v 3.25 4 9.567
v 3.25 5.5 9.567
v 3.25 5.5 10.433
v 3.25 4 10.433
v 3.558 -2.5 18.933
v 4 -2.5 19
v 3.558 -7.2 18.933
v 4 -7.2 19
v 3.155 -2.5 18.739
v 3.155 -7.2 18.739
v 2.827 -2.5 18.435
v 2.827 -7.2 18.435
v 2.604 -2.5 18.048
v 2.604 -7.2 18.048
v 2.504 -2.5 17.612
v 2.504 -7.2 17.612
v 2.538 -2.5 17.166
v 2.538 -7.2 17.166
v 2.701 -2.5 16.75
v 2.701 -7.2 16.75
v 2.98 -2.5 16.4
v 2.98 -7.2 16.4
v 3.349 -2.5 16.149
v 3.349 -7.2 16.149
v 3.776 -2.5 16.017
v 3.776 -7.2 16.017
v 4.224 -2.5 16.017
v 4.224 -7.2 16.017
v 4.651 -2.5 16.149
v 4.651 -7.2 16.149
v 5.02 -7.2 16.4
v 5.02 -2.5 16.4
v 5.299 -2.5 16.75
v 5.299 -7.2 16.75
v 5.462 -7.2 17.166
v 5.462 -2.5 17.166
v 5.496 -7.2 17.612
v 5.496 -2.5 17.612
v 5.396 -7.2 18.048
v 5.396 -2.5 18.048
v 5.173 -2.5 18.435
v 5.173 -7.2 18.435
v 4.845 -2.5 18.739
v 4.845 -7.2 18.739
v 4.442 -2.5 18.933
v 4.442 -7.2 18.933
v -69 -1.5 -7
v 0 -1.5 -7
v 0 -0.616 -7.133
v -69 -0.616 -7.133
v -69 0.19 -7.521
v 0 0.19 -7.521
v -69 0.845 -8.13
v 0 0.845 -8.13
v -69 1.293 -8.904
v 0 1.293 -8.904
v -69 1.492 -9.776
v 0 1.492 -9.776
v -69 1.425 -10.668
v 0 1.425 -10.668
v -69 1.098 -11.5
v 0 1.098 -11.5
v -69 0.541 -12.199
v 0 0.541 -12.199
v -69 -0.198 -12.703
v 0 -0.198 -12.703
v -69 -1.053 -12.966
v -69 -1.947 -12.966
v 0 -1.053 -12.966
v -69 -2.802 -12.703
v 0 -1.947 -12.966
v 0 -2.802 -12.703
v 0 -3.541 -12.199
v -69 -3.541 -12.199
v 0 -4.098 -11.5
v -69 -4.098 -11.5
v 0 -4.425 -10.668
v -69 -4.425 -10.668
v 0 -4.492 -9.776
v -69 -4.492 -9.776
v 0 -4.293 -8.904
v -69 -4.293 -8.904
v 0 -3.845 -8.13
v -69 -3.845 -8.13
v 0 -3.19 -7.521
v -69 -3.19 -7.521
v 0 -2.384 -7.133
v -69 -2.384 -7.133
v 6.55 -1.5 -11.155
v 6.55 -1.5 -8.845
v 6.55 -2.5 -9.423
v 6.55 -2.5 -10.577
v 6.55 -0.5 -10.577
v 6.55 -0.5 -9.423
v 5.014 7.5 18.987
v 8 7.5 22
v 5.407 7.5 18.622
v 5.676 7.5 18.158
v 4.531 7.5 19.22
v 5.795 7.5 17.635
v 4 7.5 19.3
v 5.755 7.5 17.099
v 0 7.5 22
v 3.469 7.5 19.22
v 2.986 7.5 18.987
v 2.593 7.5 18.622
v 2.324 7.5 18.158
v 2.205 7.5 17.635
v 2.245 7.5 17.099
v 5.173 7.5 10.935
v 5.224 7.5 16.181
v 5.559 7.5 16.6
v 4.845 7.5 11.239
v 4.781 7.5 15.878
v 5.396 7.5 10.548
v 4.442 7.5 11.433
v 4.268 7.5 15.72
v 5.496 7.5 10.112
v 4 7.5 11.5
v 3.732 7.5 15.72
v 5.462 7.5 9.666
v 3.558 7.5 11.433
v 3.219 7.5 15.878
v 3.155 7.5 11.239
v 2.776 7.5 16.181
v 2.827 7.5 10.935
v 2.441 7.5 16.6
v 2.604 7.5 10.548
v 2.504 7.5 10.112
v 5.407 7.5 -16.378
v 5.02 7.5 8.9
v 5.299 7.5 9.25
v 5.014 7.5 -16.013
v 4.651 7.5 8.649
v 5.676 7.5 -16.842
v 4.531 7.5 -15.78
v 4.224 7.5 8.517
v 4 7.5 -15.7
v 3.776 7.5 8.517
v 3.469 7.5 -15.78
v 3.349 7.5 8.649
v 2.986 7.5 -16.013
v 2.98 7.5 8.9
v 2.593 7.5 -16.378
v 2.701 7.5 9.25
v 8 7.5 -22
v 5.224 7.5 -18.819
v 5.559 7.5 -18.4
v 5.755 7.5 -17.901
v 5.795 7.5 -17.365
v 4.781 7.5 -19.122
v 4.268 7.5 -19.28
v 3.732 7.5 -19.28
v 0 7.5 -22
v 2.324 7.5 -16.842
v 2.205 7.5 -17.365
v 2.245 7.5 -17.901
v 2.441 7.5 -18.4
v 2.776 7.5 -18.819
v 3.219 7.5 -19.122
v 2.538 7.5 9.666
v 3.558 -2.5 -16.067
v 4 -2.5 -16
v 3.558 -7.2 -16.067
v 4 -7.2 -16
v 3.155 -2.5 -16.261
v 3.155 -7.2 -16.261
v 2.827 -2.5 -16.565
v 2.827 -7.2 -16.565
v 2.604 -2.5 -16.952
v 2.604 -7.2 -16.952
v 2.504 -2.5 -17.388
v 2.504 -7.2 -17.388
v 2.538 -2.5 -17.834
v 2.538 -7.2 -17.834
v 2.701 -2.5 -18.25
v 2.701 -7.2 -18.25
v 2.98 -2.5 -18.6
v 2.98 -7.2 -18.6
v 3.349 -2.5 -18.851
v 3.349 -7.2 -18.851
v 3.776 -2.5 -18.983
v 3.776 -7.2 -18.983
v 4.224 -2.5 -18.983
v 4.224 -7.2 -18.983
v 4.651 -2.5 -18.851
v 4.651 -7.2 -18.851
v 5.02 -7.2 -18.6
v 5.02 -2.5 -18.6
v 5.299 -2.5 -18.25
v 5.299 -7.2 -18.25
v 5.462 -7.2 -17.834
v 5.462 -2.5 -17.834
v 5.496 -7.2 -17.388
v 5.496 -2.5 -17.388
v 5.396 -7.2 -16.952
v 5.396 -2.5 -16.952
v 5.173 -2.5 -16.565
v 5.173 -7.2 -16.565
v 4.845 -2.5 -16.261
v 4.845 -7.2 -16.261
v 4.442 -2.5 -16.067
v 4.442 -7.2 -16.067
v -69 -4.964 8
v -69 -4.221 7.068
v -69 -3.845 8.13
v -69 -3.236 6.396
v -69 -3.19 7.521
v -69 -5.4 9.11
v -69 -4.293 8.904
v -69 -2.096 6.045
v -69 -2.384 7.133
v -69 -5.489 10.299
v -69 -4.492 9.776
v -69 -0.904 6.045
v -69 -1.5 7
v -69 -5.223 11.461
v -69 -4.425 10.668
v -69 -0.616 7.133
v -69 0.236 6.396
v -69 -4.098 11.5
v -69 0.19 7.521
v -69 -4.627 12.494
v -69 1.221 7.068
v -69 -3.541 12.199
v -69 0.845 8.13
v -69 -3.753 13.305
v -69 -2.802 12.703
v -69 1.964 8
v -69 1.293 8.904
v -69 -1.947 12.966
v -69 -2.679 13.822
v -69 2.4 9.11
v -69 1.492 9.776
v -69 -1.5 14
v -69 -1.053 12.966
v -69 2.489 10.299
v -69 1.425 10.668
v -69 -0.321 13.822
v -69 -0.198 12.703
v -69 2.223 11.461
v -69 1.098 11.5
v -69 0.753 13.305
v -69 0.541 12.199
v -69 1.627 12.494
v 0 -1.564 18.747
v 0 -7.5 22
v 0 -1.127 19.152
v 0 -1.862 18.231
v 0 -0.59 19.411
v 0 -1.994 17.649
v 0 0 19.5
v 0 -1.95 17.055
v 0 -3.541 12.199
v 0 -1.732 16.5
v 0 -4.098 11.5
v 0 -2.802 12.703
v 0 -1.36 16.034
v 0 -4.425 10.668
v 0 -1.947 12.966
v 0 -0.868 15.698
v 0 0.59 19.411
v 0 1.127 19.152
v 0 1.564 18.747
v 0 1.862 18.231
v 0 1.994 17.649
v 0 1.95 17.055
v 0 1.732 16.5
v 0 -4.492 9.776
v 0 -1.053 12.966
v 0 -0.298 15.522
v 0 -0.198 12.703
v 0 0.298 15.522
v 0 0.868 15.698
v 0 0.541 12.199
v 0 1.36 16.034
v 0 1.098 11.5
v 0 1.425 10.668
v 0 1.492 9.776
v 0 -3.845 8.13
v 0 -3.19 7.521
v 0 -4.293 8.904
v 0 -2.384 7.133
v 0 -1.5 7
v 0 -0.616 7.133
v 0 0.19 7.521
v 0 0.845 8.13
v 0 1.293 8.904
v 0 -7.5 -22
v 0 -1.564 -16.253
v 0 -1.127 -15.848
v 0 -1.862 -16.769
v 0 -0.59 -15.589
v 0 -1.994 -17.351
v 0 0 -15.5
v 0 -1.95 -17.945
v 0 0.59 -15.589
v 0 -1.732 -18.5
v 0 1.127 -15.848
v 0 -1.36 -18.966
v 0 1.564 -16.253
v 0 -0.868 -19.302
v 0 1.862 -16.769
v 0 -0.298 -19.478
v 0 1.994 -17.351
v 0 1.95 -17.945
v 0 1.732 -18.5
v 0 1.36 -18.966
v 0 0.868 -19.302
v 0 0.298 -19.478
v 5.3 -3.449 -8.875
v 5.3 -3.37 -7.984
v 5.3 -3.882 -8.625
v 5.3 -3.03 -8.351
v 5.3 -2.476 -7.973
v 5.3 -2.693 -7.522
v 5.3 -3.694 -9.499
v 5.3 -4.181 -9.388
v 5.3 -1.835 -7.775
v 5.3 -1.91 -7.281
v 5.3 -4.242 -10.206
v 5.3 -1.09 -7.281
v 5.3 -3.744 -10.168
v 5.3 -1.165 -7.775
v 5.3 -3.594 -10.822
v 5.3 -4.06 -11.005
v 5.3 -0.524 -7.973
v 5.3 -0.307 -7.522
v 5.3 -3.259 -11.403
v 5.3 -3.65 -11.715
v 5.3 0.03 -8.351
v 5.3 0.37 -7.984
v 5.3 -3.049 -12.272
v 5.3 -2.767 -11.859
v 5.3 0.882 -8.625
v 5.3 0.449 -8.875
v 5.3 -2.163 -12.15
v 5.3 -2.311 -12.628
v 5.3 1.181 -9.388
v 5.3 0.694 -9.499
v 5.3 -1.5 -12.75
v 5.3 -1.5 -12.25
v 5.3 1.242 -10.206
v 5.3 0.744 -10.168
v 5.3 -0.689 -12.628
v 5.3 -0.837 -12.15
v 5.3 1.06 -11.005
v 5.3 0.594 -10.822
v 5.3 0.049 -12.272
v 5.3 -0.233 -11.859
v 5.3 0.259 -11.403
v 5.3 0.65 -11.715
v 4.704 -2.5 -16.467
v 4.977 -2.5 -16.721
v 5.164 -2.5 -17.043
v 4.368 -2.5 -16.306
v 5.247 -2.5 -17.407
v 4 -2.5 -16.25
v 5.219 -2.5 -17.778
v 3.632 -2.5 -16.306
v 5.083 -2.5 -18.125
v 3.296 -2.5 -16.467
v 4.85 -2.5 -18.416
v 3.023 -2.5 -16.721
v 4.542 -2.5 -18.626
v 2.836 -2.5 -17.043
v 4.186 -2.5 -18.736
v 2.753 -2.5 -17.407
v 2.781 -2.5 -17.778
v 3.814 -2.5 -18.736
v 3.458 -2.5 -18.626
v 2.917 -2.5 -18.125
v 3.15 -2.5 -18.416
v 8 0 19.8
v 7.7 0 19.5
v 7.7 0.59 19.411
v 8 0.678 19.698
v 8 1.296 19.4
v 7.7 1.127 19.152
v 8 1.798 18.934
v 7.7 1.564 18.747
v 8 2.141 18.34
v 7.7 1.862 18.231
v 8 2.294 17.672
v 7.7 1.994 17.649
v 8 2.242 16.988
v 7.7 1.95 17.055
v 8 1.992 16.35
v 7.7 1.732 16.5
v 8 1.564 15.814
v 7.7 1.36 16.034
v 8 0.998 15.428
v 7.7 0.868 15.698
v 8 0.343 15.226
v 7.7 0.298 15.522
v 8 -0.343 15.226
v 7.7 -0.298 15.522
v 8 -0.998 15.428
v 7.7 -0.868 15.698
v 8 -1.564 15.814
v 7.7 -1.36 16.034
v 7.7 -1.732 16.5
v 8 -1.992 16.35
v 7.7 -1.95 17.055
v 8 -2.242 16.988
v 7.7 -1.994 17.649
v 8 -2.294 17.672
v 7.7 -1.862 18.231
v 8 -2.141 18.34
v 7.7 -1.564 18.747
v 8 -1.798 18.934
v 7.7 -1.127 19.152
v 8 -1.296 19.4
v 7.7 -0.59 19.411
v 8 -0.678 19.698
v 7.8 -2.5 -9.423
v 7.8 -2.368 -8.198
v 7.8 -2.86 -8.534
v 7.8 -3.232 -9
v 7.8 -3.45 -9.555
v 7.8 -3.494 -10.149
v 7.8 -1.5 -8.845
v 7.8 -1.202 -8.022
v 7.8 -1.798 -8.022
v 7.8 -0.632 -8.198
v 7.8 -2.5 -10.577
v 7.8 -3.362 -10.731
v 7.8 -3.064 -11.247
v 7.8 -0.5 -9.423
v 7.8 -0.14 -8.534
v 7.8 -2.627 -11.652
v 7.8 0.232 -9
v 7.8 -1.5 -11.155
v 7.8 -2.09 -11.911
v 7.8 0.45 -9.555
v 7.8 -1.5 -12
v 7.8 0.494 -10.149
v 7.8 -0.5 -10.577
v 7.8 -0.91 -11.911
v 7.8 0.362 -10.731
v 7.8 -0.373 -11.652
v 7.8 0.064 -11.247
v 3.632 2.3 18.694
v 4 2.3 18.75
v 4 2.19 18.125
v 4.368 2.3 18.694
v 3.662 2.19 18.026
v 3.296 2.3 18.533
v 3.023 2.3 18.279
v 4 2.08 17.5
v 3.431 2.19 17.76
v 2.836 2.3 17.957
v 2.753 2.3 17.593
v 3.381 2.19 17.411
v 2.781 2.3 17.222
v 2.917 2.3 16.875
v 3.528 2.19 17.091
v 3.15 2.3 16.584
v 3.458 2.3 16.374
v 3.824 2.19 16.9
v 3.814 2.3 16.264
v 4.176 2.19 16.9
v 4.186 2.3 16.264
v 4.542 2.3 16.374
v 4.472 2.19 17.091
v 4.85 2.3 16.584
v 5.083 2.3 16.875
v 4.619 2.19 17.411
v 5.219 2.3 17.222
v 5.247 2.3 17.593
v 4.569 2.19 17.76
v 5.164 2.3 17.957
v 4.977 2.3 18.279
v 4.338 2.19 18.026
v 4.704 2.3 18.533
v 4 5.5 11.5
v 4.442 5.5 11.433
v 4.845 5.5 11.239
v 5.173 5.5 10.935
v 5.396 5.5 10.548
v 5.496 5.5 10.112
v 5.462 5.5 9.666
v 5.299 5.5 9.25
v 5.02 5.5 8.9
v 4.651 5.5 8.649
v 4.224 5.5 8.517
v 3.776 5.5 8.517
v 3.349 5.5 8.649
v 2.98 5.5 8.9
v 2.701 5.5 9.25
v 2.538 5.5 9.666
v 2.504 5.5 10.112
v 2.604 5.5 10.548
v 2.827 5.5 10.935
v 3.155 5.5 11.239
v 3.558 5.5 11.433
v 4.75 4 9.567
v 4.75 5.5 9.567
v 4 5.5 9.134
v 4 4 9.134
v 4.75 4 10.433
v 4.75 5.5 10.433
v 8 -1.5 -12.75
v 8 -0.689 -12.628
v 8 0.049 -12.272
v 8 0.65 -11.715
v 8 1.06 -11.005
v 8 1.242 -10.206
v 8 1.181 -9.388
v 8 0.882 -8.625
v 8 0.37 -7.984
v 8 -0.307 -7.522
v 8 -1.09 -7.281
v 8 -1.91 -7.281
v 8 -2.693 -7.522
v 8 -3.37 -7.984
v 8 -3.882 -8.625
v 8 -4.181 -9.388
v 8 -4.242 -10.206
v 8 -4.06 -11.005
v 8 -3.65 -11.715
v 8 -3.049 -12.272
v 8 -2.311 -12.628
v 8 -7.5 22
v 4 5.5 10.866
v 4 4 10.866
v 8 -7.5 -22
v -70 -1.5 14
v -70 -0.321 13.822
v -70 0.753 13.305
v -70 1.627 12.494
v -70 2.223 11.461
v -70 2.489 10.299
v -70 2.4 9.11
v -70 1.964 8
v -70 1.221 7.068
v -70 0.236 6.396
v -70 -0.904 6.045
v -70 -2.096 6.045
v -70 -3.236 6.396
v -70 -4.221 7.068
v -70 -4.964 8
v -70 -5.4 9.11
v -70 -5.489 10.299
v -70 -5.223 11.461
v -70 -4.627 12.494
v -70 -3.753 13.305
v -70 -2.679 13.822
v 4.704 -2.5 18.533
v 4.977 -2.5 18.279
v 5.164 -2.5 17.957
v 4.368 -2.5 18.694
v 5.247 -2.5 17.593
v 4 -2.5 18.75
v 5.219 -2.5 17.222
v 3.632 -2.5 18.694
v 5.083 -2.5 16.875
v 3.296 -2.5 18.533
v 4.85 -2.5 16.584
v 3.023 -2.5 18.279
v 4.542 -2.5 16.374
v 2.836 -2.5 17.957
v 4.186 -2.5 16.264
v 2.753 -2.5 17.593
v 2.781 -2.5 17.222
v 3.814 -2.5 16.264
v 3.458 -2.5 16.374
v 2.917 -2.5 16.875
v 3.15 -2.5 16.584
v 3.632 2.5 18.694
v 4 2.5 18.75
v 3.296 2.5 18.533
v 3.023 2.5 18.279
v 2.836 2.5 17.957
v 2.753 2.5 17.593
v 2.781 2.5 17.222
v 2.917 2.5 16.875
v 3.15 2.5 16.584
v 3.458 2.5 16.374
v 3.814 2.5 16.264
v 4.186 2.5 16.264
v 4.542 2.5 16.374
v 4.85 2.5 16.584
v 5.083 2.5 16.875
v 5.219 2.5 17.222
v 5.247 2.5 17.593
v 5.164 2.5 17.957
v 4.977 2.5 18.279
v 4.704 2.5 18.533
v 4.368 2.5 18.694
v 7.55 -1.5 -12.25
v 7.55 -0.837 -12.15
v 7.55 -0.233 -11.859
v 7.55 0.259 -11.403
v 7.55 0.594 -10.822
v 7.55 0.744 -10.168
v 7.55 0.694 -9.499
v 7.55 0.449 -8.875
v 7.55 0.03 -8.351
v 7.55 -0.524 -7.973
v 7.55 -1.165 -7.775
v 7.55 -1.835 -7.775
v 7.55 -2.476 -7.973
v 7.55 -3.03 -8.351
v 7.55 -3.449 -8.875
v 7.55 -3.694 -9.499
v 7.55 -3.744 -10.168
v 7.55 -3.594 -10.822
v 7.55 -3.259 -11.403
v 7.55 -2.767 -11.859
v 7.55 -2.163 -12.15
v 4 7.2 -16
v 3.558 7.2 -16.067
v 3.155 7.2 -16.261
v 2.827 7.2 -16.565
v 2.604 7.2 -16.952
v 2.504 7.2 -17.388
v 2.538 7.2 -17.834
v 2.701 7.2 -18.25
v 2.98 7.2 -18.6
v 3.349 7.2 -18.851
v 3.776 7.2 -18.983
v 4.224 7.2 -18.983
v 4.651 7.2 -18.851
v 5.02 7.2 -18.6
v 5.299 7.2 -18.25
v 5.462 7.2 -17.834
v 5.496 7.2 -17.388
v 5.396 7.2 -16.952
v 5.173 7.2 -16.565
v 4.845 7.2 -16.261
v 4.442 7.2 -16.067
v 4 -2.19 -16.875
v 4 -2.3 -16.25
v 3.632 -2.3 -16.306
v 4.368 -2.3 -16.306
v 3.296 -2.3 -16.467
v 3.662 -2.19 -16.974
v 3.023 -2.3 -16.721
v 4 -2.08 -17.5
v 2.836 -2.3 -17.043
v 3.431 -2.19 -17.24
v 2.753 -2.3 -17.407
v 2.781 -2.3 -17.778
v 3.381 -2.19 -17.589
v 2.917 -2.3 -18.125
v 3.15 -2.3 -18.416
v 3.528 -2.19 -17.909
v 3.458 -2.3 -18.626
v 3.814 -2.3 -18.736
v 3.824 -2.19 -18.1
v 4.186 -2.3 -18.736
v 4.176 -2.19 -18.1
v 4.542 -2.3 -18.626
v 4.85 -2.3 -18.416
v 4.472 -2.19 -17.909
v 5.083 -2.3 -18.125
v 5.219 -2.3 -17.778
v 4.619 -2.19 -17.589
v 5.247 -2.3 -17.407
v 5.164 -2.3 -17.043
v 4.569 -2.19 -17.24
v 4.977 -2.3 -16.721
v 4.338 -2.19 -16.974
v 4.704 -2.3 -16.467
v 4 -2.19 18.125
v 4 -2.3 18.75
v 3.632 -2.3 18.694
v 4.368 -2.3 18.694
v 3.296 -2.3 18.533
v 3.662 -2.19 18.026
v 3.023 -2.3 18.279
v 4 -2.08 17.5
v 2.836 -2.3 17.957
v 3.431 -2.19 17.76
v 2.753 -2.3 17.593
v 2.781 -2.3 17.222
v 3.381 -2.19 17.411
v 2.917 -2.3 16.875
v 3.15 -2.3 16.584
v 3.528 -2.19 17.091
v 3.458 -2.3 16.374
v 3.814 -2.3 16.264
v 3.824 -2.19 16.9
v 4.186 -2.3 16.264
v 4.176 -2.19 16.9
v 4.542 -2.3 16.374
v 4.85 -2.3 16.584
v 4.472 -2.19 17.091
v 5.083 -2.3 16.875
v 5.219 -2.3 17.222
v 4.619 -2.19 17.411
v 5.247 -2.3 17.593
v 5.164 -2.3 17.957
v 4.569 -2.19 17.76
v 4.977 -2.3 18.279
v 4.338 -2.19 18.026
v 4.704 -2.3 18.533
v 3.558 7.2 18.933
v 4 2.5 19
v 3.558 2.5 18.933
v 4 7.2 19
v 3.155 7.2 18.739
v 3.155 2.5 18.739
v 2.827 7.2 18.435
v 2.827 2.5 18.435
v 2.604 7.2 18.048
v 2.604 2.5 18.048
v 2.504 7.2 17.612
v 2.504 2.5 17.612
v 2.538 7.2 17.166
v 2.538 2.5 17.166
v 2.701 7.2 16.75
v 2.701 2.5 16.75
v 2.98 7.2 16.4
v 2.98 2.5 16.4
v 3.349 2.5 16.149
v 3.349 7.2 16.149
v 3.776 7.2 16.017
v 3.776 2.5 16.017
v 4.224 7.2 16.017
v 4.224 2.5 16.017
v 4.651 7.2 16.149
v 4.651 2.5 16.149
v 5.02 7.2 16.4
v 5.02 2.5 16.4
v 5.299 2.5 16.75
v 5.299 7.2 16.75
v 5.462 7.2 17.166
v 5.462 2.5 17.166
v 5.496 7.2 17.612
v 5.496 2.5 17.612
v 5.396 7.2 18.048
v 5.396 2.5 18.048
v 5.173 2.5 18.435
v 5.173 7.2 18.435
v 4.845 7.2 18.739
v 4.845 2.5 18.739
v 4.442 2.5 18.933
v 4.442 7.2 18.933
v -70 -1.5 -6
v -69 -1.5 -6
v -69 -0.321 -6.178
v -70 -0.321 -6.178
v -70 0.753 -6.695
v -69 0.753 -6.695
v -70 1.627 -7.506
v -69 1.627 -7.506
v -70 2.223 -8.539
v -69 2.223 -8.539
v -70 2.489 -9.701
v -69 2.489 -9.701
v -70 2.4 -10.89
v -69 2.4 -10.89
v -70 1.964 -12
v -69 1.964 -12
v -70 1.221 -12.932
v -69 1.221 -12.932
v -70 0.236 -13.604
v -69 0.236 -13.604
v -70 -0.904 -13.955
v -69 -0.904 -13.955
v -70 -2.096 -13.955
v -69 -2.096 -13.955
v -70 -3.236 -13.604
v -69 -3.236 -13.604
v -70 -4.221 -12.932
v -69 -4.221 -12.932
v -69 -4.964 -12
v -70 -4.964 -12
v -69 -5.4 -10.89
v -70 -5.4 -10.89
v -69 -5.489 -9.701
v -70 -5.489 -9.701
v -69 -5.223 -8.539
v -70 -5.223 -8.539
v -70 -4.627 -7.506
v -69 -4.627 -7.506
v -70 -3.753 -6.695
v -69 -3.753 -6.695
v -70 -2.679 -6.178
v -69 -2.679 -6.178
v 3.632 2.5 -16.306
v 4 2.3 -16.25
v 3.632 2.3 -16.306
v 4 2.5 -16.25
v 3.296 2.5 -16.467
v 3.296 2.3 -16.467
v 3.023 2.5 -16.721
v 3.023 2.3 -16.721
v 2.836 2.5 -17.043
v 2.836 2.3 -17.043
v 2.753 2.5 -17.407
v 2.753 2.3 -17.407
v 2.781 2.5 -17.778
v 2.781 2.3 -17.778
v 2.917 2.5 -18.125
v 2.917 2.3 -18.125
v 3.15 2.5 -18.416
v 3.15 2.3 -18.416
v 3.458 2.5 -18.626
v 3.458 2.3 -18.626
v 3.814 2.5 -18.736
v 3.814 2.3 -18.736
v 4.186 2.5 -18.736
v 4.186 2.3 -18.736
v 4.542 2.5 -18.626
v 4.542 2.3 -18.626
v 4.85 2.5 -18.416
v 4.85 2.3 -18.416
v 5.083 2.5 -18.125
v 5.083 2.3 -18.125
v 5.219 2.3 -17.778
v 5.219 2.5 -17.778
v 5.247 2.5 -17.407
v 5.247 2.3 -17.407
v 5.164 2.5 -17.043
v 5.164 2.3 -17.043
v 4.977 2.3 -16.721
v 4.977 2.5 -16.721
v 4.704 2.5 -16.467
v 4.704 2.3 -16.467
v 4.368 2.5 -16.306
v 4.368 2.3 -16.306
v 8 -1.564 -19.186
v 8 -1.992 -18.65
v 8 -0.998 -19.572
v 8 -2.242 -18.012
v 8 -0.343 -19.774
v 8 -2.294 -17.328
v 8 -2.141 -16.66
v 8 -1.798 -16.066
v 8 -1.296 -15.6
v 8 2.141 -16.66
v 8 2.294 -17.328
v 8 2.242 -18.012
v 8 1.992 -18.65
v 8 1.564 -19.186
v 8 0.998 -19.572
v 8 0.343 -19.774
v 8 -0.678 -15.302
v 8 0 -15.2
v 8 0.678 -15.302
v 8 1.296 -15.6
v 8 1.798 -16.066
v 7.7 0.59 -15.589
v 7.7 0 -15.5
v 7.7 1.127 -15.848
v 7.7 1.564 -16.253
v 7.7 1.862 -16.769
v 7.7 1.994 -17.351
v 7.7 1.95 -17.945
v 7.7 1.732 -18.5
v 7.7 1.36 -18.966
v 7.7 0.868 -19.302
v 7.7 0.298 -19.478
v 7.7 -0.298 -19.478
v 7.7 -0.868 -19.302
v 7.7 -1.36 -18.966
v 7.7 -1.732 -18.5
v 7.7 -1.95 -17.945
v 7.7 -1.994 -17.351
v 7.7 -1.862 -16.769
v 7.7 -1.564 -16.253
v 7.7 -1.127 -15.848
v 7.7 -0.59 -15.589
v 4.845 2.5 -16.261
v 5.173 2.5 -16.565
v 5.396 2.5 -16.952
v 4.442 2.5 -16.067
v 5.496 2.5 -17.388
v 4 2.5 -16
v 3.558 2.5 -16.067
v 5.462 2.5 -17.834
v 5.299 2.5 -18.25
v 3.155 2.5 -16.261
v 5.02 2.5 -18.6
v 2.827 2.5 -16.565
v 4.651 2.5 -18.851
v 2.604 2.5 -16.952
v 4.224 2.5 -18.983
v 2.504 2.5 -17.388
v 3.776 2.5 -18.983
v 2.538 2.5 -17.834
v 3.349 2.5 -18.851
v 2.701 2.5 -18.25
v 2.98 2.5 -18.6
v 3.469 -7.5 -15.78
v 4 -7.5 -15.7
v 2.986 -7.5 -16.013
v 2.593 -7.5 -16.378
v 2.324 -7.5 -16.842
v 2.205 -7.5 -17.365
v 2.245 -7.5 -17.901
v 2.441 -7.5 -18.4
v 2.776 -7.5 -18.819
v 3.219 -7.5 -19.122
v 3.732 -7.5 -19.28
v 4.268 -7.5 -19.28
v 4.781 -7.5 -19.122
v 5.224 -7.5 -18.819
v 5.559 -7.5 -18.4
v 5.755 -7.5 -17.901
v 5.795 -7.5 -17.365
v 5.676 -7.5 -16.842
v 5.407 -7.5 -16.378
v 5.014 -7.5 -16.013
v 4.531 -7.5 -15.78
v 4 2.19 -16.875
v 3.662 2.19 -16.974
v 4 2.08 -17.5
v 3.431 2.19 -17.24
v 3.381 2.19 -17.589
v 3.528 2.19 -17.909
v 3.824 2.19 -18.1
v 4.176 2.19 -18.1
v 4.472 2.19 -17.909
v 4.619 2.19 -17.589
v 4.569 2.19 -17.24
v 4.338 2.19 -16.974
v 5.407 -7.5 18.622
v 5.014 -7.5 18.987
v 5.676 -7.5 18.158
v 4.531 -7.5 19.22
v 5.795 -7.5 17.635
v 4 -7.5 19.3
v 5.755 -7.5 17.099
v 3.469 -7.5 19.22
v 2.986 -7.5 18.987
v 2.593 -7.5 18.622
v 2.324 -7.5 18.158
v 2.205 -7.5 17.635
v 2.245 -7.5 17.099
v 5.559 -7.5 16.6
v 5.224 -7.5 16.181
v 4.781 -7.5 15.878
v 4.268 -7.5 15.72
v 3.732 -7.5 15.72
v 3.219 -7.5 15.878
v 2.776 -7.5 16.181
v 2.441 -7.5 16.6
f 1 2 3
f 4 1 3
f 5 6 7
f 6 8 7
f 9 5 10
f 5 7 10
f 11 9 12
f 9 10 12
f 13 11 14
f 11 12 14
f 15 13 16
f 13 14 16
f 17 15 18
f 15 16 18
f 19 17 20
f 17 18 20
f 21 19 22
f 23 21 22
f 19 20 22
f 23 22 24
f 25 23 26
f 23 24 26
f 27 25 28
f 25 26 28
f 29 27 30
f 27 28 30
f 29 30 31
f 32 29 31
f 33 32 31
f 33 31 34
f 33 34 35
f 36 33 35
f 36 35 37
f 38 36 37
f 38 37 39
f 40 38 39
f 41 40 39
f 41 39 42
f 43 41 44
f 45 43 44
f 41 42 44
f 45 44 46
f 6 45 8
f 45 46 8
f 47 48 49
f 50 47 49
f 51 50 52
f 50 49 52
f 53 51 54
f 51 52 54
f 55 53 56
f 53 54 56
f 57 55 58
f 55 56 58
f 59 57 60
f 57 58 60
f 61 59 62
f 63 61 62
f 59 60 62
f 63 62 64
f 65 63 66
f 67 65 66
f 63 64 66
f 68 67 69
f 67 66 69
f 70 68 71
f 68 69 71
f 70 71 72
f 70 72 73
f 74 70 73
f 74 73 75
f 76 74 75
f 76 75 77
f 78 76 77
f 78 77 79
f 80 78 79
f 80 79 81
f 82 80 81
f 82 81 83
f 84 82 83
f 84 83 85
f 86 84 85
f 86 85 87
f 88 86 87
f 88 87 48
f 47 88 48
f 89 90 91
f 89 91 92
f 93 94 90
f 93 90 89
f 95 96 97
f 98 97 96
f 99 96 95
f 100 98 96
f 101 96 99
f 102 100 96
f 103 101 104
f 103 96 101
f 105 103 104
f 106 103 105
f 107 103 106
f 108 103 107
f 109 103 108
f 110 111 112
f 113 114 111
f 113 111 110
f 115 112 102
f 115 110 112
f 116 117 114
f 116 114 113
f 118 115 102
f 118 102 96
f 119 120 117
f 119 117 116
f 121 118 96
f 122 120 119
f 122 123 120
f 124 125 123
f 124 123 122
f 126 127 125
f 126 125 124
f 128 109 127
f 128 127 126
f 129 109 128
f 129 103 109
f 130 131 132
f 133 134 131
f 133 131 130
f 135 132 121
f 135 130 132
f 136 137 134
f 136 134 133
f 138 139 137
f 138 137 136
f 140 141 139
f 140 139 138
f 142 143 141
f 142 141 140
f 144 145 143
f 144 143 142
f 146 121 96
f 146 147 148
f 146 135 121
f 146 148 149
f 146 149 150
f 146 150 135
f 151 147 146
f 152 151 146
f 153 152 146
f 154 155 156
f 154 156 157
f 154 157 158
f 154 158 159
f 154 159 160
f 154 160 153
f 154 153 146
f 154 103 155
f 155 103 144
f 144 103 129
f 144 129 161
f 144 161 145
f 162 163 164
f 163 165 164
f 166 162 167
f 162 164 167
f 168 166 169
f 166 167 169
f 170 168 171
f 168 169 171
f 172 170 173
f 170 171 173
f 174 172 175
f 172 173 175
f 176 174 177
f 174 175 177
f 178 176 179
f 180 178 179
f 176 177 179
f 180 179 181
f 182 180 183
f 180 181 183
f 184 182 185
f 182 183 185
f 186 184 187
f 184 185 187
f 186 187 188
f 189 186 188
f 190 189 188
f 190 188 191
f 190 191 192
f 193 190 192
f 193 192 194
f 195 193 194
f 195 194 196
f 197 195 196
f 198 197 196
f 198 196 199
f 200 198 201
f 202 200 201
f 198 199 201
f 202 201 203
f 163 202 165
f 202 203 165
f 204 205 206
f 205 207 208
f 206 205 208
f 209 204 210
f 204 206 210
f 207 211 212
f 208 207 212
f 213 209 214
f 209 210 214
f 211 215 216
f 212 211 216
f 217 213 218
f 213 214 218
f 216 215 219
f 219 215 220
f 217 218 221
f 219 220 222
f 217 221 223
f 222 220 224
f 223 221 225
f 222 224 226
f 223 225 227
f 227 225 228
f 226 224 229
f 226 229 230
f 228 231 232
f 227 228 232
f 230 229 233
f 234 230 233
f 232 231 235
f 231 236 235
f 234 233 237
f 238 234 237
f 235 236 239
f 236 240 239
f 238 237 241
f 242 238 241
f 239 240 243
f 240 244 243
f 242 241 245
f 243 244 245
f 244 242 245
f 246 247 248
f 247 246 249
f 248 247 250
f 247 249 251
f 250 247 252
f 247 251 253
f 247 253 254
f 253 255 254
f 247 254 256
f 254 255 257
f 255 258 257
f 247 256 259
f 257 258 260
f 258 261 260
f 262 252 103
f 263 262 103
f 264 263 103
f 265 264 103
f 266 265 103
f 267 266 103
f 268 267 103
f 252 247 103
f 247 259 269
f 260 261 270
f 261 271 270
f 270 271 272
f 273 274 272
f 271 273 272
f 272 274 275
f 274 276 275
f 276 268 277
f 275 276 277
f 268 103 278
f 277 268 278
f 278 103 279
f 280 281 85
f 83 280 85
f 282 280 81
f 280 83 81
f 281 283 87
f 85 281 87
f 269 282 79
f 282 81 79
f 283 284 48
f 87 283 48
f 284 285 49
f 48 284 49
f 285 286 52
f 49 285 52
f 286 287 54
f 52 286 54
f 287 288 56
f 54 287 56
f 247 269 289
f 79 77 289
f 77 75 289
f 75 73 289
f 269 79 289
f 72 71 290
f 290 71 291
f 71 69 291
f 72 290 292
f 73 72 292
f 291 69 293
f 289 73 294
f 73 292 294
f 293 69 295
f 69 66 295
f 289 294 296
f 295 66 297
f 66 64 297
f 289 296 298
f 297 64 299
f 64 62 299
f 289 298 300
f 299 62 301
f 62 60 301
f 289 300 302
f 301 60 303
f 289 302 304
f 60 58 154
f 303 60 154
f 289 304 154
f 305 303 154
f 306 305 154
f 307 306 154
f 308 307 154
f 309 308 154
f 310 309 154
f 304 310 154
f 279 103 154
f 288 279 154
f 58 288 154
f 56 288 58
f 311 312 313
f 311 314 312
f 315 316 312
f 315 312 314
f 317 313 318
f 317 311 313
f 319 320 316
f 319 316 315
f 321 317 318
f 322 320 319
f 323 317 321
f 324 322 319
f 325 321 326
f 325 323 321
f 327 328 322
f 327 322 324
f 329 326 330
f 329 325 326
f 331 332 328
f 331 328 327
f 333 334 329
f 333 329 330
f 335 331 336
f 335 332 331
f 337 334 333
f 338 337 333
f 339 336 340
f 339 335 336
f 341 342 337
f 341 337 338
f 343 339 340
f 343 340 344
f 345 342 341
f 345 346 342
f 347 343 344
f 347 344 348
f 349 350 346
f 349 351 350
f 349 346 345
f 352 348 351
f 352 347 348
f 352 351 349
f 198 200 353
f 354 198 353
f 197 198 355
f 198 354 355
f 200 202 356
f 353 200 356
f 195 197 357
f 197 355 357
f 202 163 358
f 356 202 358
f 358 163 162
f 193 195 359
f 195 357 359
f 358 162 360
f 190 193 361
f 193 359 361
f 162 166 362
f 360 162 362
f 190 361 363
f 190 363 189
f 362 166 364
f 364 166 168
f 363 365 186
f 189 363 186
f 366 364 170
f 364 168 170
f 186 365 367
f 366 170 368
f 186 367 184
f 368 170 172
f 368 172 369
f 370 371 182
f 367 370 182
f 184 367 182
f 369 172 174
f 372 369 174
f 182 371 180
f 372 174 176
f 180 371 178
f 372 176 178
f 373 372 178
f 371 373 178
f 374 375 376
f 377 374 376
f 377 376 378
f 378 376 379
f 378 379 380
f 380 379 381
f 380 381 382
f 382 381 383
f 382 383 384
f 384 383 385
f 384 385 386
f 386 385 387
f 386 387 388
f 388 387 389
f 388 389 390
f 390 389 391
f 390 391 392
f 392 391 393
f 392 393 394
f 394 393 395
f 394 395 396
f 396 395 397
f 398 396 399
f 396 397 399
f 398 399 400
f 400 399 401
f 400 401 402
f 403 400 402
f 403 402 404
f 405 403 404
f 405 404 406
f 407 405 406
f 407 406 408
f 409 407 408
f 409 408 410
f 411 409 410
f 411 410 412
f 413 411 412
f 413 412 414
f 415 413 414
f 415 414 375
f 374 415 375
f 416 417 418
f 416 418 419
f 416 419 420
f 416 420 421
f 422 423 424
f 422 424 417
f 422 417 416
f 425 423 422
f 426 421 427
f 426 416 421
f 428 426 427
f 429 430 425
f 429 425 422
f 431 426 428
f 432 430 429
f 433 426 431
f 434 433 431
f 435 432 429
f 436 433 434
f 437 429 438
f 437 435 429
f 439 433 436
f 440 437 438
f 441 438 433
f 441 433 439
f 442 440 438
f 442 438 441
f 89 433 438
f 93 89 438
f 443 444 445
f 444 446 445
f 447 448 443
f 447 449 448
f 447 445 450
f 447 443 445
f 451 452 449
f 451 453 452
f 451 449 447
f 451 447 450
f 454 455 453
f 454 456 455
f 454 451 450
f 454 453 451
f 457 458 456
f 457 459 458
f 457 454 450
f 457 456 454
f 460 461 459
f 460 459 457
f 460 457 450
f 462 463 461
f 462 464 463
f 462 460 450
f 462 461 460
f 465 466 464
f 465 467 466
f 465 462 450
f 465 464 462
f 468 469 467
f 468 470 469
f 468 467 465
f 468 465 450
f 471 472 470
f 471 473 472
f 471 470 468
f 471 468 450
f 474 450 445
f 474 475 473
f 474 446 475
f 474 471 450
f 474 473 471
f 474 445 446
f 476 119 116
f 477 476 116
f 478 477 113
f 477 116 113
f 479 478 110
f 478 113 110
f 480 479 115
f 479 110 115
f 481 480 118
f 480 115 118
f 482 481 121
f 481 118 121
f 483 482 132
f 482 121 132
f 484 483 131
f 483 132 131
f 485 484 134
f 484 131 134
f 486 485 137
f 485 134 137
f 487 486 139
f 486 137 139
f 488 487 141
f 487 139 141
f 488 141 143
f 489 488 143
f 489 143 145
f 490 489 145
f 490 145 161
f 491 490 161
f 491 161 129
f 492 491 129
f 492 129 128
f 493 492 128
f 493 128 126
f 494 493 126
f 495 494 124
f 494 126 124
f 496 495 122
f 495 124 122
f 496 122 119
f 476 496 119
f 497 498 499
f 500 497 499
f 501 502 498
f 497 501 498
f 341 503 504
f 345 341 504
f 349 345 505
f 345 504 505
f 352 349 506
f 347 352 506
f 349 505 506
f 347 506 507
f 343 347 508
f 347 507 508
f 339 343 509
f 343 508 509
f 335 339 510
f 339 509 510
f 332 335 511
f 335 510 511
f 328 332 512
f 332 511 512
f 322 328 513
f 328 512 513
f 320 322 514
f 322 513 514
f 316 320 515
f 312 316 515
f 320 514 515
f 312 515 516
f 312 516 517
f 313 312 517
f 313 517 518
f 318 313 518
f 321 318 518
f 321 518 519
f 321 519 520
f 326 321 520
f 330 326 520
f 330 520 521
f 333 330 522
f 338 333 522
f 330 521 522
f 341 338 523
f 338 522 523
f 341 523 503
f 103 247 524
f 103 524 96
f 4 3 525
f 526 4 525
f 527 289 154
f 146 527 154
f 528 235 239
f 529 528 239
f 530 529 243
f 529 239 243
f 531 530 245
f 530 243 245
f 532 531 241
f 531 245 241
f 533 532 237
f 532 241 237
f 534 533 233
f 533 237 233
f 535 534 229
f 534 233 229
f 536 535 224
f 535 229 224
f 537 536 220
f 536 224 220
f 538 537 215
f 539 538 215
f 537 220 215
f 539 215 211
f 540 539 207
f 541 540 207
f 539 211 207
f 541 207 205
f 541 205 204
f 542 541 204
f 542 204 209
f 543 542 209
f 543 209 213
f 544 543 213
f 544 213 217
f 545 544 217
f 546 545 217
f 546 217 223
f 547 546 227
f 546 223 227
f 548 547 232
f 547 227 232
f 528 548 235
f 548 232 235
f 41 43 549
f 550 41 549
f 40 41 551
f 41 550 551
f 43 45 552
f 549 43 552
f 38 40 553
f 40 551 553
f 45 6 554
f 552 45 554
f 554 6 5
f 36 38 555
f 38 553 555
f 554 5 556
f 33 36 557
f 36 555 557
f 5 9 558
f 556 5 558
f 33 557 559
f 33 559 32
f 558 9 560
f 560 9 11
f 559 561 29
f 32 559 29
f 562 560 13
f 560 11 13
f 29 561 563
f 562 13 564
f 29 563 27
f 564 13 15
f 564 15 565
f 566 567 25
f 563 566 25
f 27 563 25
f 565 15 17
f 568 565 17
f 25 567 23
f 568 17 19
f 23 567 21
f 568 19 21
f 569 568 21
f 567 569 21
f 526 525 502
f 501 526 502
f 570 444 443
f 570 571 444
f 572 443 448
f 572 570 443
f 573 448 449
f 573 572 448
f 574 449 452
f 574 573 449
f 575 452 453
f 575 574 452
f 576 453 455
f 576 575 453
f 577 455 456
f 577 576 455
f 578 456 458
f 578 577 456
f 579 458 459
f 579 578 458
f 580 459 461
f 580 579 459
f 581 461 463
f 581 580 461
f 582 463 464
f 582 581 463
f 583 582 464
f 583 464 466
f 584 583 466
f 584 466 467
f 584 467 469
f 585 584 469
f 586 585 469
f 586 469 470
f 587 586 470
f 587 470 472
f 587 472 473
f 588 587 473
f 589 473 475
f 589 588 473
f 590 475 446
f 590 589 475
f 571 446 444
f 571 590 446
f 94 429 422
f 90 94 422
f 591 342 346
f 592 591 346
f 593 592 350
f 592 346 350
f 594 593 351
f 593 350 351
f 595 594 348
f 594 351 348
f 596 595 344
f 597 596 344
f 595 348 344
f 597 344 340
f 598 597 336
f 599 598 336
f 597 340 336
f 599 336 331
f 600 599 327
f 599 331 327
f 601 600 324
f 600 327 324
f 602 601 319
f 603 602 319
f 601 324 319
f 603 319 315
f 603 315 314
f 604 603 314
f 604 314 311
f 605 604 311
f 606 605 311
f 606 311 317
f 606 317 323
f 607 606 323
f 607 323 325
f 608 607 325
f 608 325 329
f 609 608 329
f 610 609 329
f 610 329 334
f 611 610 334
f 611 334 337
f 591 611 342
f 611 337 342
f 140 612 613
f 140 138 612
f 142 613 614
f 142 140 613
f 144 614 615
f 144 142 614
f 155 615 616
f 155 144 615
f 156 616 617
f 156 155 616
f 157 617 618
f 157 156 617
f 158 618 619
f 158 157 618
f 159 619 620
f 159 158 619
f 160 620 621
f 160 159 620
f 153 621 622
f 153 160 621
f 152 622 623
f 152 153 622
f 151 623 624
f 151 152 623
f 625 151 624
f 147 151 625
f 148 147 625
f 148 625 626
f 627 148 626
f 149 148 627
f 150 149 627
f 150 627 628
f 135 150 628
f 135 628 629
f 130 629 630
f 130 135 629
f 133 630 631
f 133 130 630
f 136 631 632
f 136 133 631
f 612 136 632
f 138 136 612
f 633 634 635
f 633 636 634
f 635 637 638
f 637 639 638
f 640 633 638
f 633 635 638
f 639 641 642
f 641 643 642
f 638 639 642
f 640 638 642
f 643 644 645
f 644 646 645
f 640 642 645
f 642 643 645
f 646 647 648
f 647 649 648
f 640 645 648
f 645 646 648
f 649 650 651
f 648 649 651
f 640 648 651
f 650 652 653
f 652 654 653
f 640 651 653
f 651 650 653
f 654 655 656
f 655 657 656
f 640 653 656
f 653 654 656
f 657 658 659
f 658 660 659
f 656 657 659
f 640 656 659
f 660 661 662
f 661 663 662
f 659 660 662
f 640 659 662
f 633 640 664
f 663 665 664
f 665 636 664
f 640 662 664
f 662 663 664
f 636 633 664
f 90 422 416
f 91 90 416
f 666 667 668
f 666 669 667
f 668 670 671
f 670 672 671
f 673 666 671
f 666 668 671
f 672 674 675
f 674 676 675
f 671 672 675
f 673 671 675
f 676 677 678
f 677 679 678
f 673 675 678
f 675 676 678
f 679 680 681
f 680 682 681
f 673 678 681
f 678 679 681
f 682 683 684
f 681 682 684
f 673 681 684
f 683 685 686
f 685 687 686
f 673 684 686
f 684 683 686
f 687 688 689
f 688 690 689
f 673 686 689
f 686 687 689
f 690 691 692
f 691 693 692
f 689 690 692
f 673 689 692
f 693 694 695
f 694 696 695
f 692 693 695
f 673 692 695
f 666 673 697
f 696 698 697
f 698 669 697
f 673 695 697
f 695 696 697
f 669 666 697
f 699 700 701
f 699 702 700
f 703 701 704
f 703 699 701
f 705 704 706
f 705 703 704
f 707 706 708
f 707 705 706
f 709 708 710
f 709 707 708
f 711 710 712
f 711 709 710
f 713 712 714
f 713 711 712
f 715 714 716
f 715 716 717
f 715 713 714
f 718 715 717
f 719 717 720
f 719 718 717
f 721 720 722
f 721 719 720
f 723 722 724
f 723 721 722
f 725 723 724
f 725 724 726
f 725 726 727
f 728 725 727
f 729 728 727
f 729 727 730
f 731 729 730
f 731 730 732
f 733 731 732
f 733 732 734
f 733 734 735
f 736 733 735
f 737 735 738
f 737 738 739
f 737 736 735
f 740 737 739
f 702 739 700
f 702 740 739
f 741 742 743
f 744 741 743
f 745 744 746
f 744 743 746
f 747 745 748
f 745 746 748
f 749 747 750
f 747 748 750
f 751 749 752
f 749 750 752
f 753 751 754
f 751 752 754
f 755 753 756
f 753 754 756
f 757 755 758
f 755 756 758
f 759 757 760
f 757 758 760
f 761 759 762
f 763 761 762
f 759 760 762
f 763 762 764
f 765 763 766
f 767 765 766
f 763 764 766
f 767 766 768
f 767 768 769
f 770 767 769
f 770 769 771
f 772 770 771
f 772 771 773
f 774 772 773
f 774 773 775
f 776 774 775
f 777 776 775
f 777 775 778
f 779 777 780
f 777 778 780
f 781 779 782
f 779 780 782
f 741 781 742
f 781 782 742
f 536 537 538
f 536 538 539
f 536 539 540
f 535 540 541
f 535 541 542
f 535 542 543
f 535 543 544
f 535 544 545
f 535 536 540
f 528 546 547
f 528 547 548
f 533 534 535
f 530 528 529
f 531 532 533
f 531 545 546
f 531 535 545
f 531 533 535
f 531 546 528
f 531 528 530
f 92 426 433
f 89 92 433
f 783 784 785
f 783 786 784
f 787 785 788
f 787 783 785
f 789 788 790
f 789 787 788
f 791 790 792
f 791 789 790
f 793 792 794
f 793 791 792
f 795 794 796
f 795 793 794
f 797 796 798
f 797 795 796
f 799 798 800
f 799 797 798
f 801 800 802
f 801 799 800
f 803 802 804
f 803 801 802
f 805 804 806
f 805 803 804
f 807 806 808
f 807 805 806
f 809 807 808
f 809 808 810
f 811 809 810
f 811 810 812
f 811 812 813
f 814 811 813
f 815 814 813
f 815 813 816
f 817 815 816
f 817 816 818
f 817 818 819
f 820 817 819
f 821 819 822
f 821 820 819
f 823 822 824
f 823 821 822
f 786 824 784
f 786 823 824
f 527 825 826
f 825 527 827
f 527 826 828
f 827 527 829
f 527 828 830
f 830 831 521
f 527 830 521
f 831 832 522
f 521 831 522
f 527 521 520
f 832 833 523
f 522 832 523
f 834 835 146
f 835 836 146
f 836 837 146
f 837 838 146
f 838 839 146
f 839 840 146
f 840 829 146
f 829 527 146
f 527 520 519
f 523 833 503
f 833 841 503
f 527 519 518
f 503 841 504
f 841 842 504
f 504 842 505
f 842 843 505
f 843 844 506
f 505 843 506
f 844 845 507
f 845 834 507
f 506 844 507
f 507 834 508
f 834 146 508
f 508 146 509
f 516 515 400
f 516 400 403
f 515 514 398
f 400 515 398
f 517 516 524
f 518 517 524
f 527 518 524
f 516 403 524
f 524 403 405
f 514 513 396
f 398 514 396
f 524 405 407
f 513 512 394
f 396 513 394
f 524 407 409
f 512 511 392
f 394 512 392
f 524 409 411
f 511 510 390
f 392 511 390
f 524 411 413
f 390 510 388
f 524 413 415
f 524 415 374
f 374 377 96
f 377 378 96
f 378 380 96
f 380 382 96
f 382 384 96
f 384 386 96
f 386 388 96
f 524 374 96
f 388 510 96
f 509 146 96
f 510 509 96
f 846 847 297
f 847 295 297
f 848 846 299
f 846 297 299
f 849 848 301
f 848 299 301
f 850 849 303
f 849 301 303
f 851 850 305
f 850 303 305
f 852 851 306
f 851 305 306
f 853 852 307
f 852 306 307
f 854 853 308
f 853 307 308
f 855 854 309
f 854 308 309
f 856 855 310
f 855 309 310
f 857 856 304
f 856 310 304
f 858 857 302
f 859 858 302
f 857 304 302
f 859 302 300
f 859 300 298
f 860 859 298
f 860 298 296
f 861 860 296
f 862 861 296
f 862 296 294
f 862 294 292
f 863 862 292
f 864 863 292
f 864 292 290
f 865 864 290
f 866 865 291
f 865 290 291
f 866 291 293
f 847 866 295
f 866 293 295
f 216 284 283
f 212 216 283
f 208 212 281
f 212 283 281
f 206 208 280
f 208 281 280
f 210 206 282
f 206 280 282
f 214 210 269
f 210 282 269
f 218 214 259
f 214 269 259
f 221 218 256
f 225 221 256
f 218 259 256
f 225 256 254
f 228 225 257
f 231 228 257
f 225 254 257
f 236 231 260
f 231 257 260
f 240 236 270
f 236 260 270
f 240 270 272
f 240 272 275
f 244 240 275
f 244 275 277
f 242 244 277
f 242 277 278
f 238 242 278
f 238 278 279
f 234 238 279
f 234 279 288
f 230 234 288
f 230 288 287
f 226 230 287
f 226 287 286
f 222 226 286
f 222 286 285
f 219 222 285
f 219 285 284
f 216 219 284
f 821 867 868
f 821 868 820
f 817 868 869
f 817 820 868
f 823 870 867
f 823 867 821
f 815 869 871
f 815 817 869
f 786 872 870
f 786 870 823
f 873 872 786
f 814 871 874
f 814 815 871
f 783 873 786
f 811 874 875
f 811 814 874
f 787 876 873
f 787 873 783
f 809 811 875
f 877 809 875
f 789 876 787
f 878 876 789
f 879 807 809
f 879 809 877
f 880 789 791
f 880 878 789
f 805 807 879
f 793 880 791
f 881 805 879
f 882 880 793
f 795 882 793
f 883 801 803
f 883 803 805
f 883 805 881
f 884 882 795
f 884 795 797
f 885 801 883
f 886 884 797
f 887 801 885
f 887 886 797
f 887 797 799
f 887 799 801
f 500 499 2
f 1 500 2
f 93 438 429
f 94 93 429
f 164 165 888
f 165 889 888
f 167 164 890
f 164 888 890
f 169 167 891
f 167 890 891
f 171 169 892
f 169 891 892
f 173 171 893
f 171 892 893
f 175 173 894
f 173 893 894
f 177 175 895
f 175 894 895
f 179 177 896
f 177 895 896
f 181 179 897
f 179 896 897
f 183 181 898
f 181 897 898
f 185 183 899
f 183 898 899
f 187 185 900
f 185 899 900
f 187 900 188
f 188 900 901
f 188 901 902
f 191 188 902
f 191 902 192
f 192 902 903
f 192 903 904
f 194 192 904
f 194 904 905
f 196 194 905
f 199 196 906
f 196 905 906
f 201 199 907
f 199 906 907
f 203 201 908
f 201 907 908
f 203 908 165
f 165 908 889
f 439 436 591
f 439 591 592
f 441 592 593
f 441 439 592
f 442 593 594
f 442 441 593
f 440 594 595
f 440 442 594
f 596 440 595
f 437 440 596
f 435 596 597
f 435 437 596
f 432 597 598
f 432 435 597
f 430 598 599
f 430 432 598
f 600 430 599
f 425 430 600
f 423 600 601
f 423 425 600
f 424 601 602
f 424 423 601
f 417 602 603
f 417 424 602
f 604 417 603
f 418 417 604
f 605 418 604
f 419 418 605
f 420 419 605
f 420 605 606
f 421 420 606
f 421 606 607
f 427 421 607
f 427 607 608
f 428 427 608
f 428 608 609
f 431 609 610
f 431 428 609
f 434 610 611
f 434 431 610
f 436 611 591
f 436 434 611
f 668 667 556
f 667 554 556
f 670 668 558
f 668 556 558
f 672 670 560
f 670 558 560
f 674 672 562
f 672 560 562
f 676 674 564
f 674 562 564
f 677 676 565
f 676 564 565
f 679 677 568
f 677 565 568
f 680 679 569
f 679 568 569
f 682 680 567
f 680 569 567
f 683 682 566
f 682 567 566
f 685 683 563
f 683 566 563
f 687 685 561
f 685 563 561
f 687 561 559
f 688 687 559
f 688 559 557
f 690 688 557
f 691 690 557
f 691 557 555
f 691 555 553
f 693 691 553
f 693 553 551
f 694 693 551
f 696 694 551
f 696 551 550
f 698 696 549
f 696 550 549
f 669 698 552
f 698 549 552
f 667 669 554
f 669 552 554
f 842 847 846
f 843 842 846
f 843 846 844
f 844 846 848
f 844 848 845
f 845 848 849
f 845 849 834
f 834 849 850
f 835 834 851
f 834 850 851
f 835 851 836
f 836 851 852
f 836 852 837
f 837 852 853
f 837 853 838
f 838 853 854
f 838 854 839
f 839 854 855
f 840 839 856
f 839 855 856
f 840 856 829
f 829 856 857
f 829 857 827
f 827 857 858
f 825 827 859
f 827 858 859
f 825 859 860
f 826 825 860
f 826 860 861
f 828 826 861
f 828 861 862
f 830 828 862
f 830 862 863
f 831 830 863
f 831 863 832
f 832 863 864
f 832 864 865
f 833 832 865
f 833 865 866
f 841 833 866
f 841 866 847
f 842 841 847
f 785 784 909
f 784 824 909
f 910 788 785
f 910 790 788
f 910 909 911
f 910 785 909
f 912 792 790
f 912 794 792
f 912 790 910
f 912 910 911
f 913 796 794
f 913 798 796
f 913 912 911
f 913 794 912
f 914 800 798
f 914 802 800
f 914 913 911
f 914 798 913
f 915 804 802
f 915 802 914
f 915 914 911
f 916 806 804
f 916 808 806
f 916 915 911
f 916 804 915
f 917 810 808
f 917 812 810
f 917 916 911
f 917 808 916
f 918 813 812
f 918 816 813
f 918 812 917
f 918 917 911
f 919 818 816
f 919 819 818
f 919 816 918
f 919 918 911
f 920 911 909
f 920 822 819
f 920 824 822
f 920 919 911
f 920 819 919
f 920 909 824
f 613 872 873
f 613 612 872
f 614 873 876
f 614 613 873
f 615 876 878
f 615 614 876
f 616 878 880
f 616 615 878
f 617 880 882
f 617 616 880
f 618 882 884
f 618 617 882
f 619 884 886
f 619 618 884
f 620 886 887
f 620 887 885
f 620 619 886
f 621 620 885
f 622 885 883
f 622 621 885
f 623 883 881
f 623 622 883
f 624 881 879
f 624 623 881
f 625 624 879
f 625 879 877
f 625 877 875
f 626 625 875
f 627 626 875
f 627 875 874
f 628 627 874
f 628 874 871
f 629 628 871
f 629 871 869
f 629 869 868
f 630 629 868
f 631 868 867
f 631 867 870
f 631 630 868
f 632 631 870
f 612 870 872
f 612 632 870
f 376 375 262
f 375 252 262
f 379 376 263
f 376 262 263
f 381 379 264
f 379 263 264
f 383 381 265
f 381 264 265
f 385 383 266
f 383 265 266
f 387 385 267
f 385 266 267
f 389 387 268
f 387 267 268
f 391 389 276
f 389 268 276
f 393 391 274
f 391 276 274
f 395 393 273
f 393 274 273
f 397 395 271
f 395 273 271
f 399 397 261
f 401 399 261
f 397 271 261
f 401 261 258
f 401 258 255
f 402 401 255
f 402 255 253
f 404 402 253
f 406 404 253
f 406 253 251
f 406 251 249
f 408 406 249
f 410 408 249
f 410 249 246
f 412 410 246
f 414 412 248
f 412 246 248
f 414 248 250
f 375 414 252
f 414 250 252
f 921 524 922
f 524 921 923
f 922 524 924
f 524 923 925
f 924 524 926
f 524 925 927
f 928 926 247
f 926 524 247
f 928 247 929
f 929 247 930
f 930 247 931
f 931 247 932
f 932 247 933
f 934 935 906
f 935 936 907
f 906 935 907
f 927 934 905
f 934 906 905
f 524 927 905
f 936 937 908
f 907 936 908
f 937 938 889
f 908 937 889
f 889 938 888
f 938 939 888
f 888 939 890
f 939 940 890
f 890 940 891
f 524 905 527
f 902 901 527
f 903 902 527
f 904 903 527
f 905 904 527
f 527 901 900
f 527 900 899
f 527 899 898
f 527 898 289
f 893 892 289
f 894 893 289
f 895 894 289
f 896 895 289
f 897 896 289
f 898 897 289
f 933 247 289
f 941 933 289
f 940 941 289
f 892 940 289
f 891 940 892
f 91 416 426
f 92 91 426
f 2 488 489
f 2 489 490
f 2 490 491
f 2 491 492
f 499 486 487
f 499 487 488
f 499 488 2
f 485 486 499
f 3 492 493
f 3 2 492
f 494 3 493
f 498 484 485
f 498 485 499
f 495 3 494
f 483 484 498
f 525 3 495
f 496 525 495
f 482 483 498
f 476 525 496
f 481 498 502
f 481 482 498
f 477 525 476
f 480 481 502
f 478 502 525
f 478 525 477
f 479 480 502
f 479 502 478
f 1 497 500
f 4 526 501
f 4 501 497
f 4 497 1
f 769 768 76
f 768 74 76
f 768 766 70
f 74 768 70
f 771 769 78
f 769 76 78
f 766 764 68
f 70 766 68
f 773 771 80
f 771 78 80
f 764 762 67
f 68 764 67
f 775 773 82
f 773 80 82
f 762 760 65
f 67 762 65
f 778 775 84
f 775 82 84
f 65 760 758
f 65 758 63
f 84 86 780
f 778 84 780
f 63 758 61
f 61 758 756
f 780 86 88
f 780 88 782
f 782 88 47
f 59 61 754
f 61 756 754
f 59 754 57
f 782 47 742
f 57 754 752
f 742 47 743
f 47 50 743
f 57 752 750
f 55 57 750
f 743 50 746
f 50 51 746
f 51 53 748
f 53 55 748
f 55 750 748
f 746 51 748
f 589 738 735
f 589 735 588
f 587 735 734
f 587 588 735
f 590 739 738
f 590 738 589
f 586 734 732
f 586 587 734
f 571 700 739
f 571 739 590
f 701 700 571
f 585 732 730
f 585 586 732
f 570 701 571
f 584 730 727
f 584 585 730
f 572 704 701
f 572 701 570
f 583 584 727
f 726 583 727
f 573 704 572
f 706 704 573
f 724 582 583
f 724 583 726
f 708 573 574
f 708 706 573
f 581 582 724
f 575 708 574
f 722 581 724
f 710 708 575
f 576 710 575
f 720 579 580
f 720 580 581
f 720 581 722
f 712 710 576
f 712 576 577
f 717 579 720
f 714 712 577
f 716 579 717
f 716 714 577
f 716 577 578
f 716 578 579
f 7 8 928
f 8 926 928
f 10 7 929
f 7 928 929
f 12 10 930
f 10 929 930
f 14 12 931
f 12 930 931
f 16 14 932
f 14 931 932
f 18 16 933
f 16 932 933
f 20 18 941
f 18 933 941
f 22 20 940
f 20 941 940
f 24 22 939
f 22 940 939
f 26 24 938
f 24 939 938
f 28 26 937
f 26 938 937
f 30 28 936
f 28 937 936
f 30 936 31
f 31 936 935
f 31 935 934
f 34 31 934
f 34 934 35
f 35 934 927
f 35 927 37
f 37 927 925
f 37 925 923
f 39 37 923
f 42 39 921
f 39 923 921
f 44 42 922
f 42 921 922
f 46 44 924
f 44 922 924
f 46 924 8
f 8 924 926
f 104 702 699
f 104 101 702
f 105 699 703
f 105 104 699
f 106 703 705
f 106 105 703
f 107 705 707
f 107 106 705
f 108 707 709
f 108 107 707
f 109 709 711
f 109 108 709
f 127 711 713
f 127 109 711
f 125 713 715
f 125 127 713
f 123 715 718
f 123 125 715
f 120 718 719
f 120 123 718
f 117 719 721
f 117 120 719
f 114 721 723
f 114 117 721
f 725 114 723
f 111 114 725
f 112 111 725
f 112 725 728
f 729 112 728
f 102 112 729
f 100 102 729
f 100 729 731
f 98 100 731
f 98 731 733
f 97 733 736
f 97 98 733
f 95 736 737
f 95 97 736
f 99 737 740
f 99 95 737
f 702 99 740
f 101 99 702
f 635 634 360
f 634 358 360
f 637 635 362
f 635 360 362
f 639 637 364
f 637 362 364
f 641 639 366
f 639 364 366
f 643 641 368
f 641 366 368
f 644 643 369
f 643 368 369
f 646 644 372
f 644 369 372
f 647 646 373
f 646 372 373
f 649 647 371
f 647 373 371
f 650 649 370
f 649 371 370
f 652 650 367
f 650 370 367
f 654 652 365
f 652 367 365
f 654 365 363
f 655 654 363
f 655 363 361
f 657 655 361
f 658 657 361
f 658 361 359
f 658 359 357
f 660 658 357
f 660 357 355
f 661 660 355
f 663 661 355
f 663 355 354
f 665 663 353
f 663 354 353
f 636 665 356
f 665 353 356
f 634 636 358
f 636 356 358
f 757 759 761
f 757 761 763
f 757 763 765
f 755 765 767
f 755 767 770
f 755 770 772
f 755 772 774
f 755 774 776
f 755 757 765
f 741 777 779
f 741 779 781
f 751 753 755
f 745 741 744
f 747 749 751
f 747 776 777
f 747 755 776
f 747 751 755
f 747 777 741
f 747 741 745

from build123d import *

# Parameters (mm, degrees)
PLATE_SKETCH_W               = 44
PLATE_SKETCH_H               = 15
PLATE_DEPTH                  = 8
TAPPED_HOLE_FACE_D           = 4
TAPPED_HOLE_FACE_CSINK_D     = 4.6
TAPPED_HOLE_FACE_CSINK_ANGLE = 90
RODS_DEPTH                   = 60
RODS_DEPTH_BACK              = 17
RODS_SKETCH_R                = 3
PISTON_SKETCH_R              = 4
PISTON_DEPTH                 = 1
TAPPED_HOLES_TOP_AT_2_COUNT  = 2
TAPPED_HOLES_TOP_AT_2_PITCH  = 35
SHCS_SEAT_SKETCH_R           = 2.75
SHCS_SEAT_DEPTH              = 2.7
SHCS_HEAD_SKETCH_R           = 2.25
SHCS_HEAD_DEPTH              = 2.5
SHCS_HEX_DEPTH               = 1.25
SHCS_CHAM_SIZE               = 0.25
SS_SEAT_SKETCH_R             = 1.5
SS_SEAT_DEPTH                = 2
SS_HEX_DEPTH                 = 1.5


with BuildPart() as part:
    # Plate_Sketch → Plate (new body)
    with BuildSketch(Plane(origin=(0, 0, 0), x_dir=(0, 0, -1), z_dir=(1, 0, 0))):
        Rectangle(PLATE_SKETCH_W, PLATE_SKETCH_H)
    extrude(amount=PLATE_DEPTH)

    # Tapped Hole Face (through all)
    with Locations(Plane(origin=(8, 0, 0), x_dir=(0, 0, -1), z_dir=(1, 0, 0))):
        with Locations((-17.5, 0), (17.5, 0)):
            CounterSinkHole(TAPPED_HOLE_FACE_D / 2, TAPPED_HOLE_FACE_CSINK_D / 2, counter_sink_angle=TAPPED_HOLE_FACE_CSINK_ANGLE)

    # Rods_Sketch → Rods (add, two sides: drawn at the far end of the back side and taken through both)
    with BuildSketch(Plane.ZY.offset(9).offset(-RODS_DEPTH_BACK)):
        with Locations((-10, -1.5)):
            Circle(RODS_SKETCH_R)
        with Locations(Location((10, -1.5, 0), (0, 0, 180))):
            Circle(RODS_SKETCH_R)
    extrude(amount=RODS_DEPTH + RODS_DEPTH_BACK)

    # Piston_Sketch → Piston (add)
    with BuildSketch(Plane.ZY.offset(69)):
        with Locations((-10, -1.5)):
            Circle(PISTON_SKETCH_R)
        with Locations((10, -1.5)):
            Circle(PISTON_SKETCH_R)
    extrude(amount=PISTON_DEPTH)

    # Tapped Holes Top Profile → Tapped Holes Top (revolve, cut)
    with BuildSketch(Plane(origin=(4, 7.5, -17.5), x_dir=(0, 0, 1), z_dir=(1, 0, 0))):
        Polygon((0, 0), (0, 5.420408726), (1.25, 5.2), (1.25, 5), (1.5, 5), (1.5, 0.3), (1.8, 0), align=None)
    tapped_holes_top = revolve(axis=Axis((4, 13.85, -17.5), (0, -1, 0)), mode=Mode.SUBTRACT)

    # Tapped Holes Top at 2: Tapped Holes Top ×2
    with Locations(*[(0, 0, i * TAPPED_HOLES_TOP_AT_2_PITCH) for i in range(1, TAPPED_HOLES_TOP_AT_2_COUNT)]):
        add(tapped_holes_top, mode=Mode.SUBTRACT)

    # Tapped Holes Top Mirror: Tapped Holes Top across plane
    add(tapped_holes_top.mirror(Plane.ZX), mode=Mode.SUBTRACT)

    # Tapped Holes Top Mirror copy 1 sketch → Tapped Holes Top Mirror copy 1 (revolve, cut)
    with BuildSketch(Plane(origin=(4, -7.5, 17.5), x_dir=(0, 0, 1), z_dir=(1, 0, 0))):
        Polygon((0, 0), (0, -5.420408726), (1.25, -5.2), (1.25, -5), (1.5, -5), (1.5, -0.3), (1.8, 0), align=None)
    revolve(axis=Axis((4, -13.85, 17.5), (0, -1, 0)), mode=Mode.SUBTRACT)

    # SHCS Seat_Sketch → SHCS Seat (cut)
    with BuildSketch(Plane(origin=(8, 0, 0), x_dir=(0, 0, -1), z_dir=(1, 0, 0))):
        with Locations((10, -1.5)):
            Circle(SHCS_SEAT_SKETCH_R)
    extrude(amount=-SHCS_SEAT_DEPTH, mode=Mode.SUBTRACT)

    # SHCS Head_Sketch → SHCS Head (add)
    with BuildSketch(Plane(origin=(5.3, 0, 0), x_dir=(0, 0, -1), z_dir=(1, 0, 0))):
        with Locations((10, -1.5)):
            Circle(SHCS_HEAD_SKETCH_R)
    extrude(amount=SHCS_HEAD_DEPTH)

    # SHCS Hex_Sketch → SHCS Hex (cut)
    with BuildSketch(Plane(origin=(7.8, 0, 0), x_dir=(0, 0, -1), z_dir=(1, 0, 0))):
        Polygon((10.577350269, -2.5), (11.154700538, -1.5), (10.577350269, -0.5), (9.422649731, -0.5), (8.845299462, -1.5), (9.422649731, -2.5), align=None)
    extrude(amount=-SHCS_HEX_DEPTH, mode=Mode.SUBTRACT)

    # SHCS Cham
    shcs_cham_edges = [part.edges().sort_by_distance(p)[0] for p in [
        (7.8, -1.5, -7.75),
    ]]
    chamfer(shcs_cham_edges, length=SHCS_CHAM_SIZE)

    # SS Seat_Sketch → SS Seat (cut)
    with BuildSketch(Plane(origin=(0, 7.5, 0), x_dir=(-1, 0, 0), z_dir=(0, 1, 0))):
        with Locations(Location((-4, 10, 0), (0, 0, 90))):
            Circle(SS_SEAT_SKETCH_R)
    extrude(amount=-SS_SEAT_DEPTH, mode=Mode.SUBTRACT)

    # SS Hex_Sketch → SS Hex (cut)
    with BuildSketch(Plane(origin=(0, 5.5, 0), x_dir=(-1, 0, 0), z_dir=(0, 1, 0))):
        Polygon((-4.75, 9.566987298), (-4, 9.133974596), (-3.25, 9.566987298), (-3.25, 10.433012702), (-4, 10.866025404), (-4.75, 10.433012702), align=None)
    extrude(amount=-SS_HEX_DEPTH, mode=Mode.SUBTRACT)


solid = part.part
